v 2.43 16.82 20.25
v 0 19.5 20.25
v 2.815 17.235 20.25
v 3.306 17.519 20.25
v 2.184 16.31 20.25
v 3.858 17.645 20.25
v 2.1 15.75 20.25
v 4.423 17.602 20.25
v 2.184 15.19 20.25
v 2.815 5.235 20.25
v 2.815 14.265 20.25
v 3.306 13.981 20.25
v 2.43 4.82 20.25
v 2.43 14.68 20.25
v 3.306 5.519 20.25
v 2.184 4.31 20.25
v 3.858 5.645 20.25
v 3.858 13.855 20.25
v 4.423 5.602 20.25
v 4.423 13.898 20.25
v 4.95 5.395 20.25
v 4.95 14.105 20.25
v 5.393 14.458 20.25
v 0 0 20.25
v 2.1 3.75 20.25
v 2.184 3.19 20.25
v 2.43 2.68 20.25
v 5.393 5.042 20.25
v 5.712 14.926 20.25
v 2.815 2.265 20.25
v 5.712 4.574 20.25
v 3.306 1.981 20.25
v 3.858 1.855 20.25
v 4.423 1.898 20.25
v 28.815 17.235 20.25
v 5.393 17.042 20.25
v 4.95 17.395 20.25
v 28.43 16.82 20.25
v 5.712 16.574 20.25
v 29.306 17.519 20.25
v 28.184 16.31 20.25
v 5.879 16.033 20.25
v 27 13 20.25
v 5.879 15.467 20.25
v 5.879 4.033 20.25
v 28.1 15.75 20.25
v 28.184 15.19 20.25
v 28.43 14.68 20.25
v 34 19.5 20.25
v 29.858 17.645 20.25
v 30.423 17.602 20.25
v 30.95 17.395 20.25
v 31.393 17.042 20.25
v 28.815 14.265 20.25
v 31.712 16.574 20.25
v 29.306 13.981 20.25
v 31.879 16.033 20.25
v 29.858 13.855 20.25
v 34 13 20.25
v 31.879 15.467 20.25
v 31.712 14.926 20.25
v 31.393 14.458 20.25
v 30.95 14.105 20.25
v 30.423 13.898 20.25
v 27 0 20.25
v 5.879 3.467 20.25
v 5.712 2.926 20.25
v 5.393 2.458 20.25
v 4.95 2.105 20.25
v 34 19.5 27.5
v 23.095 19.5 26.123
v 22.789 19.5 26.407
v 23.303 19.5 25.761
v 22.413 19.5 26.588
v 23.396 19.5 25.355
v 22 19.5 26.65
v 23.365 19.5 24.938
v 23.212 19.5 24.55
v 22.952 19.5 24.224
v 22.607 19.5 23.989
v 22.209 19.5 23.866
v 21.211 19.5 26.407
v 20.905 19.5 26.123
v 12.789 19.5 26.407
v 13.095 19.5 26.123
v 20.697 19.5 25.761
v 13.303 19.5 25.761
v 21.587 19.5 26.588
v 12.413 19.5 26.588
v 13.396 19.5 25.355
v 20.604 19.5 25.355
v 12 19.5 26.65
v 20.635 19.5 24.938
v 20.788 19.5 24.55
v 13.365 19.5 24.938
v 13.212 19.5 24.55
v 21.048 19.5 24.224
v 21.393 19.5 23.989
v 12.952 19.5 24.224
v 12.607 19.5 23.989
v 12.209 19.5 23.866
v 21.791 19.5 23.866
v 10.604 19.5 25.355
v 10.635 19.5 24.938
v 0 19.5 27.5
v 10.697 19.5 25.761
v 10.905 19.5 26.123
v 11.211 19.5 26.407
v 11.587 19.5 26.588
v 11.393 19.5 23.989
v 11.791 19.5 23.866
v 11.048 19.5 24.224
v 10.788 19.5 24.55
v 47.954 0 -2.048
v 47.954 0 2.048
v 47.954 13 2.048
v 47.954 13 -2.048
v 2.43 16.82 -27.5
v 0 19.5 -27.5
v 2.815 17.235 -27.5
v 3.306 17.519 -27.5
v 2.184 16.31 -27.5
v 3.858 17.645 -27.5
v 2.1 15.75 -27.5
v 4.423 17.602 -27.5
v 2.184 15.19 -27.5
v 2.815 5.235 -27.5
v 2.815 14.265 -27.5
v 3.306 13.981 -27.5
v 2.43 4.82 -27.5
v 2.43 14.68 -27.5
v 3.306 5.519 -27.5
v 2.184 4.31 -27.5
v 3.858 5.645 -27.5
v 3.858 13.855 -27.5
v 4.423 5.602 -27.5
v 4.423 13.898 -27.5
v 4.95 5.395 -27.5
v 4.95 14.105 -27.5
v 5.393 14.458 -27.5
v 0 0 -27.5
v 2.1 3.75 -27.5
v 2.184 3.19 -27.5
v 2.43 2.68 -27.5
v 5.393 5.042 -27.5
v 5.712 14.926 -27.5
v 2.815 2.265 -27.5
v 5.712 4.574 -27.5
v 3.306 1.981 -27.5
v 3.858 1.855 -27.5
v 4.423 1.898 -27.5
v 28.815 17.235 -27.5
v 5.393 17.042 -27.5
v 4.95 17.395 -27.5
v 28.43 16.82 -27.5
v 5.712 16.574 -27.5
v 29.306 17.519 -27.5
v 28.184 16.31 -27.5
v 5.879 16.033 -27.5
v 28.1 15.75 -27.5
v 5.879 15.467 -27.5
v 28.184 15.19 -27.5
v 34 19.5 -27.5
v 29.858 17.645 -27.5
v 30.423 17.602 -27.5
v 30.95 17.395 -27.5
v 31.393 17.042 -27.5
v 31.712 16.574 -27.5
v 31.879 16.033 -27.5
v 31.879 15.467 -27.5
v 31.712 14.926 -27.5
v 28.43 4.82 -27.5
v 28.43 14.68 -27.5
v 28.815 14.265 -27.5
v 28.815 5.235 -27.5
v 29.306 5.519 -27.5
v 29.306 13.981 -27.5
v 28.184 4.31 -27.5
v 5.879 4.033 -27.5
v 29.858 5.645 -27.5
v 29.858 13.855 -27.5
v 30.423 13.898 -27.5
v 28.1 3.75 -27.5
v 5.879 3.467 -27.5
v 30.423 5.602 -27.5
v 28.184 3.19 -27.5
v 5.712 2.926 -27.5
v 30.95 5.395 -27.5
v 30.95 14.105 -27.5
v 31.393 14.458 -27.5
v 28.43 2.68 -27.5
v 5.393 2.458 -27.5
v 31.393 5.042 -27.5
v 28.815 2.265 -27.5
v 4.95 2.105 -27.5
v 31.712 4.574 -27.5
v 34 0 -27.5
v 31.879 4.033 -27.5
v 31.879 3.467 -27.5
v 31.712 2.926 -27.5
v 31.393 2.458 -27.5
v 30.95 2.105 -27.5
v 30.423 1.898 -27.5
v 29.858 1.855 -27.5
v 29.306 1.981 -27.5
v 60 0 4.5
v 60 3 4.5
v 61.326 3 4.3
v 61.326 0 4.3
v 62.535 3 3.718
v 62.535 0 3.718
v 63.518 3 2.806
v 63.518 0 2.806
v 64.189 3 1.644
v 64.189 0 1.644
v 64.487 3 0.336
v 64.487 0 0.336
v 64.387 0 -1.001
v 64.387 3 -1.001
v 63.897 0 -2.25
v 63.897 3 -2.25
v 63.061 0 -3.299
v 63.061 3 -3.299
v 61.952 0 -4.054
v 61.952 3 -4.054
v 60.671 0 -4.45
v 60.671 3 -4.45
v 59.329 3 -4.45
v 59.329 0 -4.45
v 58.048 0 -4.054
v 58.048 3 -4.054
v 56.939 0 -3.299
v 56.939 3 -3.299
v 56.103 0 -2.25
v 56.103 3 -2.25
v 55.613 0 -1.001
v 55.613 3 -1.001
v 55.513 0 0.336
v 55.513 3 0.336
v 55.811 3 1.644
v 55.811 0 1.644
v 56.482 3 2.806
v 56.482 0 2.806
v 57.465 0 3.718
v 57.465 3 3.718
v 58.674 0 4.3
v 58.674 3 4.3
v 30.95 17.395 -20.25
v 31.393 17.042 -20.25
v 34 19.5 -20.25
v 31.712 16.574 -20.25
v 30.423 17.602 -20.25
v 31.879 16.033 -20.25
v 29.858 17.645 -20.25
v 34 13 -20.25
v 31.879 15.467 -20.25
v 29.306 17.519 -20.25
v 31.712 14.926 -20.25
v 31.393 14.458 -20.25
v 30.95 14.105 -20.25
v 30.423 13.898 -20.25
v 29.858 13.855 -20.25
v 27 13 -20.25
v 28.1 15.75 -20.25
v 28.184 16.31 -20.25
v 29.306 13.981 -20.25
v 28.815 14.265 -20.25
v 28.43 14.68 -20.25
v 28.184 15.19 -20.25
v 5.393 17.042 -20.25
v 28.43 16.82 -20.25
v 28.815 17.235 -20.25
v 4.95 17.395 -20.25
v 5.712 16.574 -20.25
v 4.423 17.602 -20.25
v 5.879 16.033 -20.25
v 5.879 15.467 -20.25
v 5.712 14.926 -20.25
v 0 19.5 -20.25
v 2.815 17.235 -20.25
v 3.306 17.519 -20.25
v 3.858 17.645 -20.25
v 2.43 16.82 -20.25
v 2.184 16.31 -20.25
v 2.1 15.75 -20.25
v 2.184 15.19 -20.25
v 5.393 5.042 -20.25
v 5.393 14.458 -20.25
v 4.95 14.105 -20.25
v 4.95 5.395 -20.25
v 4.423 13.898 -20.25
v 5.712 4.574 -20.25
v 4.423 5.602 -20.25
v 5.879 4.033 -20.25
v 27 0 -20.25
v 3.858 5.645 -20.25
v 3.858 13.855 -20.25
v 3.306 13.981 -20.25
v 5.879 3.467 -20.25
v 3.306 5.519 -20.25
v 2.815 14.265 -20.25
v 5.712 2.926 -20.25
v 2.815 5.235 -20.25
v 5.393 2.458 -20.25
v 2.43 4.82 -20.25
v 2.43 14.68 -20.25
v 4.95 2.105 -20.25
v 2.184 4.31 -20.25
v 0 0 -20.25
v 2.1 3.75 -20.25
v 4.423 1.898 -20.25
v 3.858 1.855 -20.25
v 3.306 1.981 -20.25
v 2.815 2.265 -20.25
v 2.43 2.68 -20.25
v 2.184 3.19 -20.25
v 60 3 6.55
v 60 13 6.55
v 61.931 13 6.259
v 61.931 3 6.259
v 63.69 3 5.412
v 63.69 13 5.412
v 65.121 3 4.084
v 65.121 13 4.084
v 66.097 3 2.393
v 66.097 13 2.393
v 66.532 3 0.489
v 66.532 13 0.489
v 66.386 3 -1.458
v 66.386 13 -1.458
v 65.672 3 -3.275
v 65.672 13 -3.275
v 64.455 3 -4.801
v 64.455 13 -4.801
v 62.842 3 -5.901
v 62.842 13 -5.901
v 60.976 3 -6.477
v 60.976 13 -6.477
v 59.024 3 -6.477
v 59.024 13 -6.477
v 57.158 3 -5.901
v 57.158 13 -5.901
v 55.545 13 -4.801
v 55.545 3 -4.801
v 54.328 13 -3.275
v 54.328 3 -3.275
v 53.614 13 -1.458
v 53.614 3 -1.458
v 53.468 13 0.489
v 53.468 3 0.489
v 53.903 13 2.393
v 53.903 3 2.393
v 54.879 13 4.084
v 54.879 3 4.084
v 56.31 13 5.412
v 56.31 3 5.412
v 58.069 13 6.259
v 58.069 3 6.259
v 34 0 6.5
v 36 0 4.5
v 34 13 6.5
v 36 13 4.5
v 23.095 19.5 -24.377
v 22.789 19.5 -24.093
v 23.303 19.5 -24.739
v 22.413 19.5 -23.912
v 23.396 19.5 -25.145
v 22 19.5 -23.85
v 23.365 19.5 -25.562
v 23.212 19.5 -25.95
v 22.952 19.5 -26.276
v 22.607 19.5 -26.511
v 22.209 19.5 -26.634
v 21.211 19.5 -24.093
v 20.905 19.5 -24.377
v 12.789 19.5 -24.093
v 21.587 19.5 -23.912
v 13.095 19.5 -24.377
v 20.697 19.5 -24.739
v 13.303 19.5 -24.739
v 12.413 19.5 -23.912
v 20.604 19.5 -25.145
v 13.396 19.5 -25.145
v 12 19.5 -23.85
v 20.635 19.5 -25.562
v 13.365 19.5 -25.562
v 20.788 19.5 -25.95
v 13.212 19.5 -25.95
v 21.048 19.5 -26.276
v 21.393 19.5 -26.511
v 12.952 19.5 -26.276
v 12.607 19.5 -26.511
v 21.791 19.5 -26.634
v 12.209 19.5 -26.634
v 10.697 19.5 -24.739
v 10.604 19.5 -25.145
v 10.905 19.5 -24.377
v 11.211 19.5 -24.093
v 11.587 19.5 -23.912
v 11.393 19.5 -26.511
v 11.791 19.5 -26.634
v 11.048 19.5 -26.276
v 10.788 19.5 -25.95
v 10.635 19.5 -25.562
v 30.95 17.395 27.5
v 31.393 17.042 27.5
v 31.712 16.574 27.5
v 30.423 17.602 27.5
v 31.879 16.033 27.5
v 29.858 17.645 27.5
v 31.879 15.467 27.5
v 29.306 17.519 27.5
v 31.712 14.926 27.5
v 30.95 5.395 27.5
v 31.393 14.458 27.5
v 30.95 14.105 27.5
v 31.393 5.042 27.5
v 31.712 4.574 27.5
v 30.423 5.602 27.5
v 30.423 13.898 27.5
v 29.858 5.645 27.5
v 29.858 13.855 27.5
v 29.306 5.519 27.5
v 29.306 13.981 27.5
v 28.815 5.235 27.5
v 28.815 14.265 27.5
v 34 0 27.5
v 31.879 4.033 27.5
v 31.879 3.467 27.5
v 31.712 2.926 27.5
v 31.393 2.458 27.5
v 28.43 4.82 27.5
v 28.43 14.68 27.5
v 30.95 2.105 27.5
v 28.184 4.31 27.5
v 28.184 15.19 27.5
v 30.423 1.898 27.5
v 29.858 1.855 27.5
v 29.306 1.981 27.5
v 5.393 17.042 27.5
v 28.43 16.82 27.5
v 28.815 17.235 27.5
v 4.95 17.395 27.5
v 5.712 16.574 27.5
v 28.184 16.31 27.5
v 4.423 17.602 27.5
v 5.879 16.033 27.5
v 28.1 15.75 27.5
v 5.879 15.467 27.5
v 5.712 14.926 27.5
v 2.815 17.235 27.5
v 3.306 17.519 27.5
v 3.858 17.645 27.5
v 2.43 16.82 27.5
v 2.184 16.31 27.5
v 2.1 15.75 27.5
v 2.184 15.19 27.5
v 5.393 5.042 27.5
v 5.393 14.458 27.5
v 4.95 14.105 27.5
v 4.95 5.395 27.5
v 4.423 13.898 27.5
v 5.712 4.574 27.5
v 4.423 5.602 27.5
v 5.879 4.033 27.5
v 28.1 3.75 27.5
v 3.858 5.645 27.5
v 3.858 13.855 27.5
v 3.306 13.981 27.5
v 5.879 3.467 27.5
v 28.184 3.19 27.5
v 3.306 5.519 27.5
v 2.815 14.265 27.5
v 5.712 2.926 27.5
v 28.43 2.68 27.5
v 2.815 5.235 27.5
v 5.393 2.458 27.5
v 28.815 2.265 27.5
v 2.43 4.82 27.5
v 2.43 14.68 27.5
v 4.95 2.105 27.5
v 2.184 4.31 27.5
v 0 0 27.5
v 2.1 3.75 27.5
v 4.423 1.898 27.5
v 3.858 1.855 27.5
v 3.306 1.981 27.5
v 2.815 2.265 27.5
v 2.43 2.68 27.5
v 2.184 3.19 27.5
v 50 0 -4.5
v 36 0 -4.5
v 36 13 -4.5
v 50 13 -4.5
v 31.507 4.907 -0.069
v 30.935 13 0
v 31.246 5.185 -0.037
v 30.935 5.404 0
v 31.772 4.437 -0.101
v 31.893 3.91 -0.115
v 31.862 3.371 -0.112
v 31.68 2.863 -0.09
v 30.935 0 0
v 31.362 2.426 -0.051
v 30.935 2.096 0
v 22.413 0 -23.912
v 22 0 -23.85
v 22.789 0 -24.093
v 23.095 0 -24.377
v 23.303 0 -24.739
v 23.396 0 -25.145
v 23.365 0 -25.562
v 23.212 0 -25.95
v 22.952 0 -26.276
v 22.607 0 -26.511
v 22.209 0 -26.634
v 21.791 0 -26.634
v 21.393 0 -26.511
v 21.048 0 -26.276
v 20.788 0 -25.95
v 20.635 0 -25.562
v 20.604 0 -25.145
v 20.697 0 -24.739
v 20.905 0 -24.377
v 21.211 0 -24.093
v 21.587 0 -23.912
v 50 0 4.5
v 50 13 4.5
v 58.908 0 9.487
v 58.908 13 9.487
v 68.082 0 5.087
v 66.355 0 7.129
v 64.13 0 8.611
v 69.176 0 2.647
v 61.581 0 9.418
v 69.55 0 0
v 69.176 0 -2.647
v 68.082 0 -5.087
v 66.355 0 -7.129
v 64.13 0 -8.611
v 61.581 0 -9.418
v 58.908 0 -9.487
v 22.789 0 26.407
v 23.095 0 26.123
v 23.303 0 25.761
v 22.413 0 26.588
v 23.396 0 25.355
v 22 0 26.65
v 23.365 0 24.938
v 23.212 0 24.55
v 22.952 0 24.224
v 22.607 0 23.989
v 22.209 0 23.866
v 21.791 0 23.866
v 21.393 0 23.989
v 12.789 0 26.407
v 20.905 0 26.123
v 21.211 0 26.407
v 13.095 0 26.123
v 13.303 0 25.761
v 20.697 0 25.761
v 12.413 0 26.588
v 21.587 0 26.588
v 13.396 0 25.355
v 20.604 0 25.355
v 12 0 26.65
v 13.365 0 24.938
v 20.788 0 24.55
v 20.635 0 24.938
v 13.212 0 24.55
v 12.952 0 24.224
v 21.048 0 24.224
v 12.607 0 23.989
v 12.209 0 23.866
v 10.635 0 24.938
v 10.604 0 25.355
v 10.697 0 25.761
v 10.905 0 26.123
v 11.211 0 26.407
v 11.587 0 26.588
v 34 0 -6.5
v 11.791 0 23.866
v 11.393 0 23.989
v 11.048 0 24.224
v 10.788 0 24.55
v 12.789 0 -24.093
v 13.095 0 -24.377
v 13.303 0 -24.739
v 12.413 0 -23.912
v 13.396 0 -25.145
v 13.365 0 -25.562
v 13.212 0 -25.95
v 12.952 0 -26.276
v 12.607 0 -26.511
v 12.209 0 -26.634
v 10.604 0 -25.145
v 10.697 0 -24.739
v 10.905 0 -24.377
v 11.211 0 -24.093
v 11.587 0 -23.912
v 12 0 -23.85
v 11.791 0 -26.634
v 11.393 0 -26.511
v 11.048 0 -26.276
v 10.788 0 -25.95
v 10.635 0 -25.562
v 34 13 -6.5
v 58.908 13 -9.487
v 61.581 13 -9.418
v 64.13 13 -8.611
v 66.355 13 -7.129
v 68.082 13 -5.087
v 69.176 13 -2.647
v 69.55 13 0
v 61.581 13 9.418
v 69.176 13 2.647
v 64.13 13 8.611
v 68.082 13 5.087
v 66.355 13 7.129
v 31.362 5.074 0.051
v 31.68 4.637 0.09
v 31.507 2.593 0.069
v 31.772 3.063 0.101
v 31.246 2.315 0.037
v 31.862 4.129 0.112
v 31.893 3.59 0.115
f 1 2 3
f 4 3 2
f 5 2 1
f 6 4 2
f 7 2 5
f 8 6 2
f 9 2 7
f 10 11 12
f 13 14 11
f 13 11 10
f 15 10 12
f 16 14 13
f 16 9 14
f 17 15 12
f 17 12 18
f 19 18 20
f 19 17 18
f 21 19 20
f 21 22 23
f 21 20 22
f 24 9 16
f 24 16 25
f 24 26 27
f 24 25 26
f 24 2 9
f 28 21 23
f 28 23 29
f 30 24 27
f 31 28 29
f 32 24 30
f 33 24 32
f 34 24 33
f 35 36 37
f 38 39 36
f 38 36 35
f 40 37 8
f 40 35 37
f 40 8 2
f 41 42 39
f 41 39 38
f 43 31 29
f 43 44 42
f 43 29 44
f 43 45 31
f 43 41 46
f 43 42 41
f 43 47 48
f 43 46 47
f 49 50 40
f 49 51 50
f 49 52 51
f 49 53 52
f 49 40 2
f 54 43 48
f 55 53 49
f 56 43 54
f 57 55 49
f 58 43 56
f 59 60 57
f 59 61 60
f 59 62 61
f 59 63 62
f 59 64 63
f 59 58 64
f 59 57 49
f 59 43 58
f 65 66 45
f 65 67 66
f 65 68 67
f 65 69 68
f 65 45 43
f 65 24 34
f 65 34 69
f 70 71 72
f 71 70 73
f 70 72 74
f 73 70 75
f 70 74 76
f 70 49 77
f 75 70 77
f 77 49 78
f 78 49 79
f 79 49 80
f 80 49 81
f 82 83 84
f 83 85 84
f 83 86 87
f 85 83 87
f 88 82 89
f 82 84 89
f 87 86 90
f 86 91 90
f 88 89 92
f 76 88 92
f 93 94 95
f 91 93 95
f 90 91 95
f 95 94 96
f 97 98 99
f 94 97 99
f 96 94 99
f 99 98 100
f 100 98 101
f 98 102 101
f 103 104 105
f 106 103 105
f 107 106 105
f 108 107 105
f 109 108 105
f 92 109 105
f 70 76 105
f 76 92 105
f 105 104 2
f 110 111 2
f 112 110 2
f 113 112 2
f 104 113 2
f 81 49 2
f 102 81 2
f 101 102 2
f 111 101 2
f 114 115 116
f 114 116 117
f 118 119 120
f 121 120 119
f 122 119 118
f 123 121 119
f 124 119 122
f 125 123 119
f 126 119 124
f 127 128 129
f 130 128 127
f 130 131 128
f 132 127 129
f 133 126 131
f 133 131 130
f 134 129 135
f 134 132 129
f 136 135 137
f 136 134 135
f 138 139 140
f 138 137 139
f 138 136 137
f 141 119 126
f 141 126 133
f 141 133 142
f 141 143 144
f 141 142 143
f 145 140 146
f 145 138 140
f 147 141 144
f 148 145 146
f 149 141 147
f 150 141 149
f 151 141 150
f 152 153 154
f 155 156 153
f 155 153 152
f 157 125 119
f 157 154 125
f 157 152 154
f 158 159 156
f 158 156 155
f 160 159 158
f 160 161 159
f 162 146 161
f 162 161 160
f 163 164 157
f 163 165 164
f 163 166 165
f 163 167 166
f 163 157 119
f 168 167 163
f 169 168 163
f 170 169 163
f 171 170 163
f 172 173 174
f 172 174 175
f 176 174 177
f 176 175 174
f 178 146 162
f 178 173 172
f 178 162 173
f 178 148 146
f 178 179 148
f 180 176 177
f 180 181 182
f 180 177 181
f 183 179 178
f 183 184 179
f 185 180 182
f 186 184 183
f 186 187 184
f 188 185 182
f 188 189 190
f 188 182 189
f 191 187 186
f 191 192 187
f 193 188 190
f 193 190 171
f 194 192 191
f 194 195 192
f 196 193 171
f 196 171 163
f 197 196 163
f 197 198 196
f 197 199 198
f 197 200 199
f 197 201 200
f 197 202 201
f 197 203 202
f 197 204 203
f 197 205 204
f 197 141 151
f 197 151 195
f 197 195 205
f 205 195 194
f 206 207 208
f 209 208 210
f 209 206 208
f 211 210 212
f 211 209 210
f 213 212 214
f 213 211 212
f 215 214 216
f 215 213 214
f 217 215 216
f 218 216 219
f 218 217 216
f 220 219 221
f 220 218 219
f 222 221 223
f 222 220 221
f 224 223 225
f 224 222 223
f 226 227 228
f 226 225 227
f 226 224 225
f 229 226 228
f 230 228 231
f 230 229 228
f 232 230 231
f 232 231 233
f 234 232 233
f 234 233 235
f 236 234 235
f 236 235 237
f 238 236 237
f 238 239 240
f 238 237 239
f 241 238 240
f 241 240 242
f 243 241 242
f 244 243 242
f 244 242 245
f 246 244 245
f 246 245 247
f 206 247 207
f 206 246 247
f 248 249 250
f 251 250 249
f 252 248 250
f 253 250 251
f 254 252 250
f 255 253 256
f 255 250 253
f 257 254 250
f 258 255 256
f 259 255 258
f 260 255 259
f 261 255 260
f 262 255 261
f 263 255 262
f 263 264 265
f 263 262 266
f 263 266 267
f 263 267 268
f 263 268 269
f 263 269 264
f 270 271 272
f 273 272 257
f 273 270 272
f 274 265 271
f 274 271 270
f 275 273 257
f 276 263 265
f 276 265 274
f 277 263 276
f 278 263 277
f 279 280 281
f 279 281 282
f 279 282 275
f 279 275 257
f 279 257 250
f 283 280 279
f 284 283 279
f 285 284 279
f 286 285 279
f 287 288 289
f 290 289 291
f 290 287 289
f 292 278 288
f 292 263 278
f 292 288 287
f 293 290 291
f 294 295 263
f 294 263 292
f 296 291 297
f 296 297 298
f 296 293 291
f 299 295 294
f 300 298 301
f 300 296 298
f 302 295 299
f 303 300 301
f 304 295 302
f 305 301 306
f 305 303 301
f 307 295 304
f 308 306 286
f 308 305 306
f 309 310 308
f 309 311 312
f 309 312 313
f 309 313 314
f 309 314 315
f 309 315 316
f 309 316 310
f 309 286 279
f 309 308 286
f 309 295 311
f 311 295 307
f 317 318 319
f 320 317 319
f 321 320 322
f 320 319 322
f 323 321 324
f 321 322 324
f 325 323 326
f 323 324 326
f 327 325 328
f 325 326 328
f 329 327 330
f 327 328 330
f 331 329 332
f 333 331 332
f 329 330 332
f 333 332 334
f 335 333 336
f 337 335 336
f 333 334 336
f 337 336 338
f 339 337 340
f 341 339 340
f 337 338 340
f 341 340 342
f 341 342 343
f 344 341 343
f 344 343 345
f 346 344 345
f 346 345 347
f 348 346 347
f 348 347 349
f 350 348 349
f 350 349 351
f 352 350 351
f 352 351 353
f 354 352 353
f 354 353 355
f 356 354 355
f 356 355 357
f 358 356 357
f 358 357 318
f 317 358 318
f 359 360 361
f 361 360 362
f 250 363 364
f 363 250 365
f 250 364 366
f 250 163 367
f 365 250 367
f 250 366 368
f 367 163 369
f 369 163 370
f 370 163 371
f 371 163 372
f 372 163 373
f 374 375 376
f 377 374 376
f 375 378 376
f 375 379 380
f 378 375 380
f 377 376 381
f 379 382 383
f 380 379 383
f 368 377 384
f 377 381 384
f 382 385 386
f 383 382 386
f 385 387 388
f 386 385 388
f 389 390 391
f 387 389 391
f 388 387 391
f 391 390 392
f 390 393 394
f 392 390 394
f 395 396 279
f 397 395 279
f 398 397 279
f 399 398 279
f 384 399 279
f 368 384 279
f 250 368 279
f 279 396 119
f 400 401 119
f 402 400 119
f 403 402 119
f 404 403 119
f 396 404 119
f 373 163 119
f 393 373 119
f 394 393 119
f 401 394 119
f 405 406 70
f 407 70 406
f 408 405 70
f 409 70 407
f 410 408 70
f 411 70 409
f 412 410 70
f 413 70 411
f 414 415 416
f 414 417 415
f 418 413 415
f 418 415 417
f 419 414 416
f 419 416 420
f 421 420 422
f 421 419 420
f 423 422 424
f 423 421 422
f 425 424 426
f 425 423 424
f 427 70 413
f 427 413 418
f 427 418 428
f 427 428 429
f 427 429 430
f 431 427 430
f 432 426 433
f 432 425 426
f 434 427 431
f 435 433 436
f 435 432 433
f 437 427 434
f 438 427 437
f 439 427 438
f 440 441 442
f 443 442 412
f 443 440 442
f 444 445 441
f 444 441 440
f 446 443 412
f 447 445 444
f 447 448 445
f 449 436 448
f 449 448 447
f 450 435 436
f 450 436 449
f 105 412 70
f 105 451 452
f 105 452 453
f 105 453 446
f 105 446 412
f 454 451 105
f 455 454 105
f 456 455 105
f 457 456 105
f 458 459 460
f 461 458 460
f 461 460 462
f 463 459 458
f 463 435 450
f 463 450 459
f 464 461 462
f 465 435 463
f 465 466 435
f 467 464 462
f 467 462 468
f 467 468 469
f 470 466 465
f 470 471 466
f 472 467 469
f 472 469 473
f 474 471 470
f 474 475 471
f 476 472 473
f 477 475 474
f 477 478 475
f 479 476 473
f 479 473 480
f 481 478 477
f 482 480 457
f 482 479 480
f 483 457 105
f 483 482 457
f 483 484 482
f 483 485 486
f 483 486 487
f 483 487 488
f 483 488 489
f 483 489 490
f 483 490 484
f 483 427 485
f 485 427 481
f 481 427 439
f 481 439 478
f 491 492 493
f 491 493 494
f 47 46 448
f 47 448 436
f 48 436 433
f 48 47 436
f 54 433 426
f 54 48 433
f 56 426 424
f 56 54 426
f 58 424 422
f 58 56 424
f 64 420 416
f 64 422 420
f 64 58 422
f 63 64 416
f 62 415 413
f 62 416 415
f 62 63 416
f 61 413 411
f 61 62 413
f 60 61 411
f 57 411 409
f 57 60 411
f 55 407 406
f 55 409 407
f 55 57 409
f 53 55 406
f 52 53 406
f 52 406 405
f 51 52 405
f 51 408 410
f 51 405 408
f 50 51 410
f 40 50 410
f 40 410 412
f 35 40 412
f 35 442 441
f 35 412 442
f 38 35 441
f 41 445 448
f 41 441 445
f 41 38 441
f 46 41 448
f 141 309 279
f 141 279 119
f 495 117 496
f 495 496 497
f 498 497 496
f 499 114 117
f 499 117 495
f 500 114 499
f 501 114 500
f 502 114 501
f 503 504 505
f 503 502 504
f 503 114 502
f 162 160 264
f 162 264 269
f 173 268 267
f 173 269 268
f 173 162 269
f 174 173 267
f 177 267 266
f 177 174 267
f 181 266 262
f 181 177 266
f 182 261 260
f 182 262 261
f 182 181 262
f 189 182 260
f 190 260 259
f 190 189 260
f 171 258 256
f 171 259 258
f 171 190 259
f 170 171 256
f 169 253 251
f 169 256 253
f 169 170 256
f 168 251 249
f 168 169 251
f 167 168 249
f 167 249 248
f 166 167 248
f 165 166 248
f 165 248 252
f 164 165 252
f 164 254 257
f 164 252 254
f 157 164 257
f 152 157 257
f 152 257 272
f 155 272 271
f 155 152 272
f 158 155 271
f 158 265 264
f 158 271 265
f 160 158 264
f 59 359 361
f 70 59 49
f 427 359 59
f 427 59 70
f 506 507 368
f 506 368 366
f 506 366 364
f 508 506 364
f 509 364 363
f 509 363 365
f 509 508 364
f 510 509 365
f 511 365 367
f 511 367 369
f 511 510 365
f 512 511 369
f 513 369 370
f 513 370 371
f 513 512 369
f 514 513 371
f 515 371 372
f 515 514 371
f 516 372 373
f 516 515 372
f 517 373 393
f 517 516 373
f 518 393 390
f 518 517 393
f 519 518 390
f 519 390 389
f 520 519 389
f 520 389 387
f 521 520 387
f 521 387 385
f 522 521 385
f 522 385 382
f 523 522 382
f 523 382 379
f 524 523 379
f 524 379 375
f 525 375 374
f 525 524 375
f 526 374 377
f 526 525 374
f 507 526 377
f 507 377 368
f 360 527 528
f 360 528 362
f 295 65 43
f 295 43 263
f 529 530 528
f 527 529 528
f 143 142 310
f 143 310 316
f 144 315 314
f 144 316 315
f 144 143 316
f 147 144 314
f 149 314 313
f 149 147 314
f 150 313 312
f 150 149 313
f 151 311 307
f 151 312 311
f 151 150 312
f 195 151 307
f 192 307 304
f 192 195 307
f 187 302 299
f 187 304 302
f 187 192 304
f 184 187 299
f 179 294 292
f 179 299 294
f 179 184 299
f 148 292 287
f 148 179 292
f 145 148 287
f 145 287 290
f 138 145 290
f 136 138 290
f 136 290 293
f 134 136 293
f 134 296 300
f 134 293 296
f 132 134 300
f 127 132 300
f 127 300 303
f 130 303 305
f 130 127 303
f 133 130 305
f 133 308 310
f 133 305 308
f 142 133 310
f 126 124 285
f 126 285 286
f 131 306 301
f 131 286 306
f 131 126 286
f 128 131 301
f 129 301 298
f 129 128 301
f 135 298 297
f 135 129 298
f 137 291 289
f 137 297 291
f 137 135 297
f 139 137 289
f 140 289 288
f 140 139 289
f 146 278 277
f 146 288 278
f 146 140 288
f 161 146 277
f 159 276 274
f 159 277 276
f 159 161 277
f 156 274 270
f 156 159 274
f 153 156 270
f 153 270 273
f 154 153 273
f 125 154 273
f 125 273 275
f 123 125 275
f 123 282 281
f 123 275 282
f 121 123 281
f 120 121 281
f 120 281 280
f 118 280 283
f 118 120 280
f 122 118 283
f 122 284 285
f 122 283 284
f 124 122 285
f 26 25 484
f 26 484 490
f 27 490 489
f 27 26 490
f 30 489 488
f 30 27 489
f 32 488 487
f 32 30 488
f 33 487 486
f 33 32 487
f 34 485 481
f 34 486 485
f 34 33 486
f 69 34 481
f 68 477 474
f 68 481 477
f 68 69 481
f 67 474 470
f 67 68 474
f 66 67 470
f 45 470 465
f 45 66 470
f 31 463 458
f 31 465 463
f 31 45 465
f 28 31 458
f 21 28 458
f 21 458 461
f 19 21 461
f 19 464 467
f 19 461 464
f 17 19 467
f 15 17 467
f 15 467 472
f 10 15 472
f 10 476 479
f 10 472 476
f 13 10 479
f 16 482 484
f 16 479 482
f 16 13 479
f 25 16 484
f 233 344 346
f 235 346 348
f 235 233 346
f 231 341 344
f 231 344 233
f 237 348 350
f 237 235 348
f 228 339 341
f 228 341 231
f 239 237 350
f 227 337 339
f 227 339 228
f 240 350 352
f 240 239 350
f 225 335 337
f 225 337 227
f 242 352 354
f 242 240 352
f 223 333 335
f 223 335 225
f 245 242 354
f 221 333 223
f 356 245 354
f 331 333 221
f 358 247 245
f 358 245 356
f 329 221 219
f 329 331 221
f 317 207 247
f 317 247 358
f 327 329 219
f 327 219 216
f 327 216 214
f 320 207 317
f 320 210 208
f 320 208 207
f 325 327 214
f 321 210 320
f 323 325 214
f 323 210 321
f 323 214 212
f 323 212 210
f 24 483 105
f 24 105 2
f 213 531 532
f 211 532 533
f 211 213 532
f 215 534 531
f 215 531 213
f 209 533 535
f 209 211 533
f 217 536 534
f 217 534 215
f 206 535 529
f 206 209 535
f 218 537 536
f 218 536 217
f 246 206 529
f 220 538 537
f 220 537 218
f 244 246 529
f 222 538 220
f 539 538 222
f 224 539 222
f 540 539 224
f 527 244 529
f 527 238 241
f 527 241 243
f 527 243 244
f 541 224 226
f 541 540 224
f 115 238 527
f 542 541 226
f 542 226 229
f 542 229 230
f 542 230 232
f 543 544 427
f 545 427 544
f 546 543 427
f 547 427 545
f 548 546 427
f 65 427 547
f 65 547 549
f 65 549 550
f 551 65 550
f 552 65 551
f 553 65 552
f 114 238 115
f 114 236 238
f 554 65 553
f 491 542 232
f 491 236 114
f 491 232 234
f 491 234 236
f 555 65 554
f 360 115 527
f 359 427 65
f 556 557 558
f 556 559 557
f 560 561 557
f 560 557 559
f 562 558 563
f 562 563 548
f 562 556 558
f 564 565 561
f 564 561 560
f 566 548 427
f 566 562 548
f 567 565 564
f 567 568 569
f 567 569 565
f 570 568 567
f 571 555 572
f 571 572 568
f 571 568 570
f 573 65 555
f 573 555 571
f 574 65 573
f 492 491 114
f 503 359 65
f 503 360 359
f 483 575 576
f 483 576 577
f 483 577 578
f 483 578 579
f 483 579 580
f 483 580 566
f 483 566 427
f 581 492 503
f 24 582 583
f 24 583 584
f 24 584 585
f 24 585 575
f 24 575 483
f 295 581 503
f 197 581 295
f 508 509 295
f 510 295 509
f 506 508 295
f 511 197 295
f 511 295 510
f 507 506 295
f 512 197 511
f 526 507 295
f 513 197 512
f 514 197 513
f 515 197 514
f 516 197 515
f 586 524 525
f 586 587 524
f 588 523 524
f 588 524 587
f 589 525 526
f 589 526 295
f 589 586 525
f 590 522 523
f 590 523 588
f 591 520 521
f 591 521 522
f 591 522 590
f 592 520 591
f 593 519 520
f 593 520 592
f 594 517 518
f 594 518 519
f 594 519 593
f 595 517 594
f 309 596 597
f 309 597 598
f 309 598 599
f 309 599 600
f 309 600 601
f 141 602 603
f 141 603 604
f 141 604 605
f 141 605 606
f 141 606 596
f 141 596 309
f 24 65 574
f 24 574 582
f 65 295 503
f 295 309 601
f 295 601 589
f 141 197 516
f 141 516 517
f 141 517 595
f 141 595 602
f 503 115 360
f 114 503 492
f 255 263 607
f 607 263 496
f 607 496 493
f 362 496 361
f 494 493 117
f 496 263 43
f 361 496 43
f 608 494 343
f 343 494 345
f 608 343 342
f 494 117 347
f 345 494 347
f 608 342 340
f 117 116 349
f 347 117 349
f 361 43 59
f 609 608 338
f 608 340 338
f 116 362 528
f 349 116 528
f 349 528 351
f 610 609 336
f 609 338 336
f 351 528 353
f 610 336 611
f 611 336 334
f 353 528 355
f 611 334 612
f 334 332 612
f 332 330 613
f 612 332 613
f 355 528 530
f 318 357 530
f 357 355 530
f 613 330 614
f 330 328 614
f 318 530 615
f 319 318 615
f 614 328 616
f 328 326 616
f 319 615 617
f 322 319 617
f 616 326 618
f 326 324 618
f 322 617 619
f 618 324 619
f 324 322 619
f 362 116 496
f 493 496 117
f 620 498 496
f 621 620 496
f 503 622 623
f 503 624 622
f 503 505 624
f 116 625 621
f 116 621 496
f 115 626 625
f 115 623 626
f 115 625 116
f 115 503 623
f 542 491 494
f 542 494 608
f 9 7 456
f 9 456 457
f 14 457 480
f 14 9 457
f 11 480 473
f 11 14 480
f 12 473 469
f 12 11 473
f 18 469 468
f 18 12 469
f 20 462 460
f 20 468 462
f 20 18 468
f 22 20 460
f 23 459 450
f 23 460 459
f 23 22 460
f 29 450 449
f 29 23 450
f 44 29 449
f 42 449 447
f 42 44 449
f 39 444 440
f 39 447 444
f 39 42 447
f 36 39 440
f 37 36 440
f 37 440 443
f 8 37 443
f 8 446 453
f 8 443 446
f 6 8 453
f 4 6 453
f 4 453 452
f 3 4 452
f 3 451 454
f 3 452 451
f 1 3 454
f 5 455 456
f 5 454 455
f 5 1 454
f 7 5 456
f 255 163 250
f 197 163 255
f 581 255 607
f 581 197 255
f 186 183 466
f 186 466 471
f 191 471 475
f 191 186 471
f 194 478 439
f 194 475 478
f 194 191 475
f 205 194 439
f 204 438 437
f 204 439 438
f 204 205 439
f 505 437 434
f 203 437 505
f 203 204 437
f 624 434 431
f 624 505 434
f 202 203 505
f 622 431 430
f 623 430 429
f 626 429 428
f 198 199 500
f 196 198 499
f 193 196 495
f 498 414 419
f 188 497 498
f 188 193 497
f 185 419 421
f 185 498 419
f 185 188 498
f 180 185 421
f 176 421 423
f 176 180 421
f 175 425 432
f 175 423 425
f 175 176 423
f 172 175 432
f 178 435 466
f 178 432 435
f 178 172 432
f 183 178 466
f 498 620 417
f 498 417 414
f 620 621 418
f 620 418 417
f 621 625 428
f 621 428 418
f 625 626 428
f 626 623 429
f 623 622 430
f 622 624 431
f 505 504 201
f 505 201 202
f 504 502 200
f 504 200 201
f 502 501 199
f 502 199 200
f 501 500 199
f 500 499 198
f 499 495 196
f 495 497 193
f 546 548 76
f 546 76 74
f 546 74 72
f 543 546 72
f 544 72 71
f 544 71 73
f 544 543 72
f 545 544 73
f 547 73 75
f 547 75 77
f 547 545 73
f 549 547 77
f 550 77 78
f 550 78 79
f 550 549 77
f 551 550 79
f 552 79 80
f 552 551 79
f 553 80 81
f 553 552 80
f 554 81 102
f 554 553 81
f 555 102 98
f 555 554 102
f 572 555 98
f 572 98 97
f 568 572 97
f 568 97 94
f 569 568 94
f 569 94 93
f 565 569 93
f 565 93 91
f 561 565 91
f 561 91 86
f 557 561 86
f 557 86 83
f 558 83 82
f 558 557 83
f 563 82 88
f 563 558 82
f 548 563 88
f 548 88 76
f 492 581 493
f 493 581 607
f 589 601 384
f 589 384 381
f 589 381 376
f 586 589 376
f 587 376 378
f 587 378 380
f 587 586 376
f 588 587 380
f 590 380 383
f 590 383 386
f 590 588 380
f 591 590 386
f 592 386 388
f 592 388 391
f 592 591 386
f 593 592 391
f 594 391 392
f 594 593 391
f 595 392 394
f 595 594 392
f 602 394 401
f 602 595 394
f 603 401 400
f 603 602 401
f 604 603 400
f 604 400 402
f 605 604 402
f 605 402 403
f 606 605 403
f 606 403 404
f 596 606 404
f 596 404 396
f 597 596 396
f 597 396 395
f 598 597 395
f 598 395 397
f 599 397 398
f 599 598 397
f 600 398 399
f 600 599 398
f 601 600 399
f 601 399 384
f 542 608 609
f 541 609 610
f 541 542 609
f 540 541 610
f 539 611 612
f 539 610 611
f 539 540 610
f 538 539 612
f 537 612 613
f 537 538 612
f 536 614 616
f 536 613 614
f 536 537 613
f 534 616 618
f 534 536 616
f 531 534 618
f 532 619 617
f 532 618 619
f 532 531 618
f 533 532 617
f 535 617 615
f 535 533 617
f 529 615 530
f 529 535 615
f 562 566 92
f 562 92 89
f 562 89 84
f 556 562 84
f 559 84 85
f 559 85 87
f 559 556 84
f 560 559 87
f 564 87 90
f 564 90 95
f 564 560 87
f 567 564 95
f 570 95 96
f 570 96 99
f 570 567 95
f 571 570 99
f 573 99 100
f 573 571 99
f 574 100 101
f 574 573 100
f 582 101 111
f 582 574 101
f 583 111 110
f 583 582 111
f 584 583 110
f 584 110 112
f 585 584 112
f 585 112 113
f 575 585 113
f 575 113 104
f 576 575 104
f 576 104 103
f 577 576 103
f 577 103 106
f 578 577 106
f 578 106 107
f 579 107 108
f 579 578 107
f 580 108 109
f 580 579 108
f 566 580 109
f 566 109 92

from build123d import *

# Parameters (mm, degrees)
SKETCH8_R                      = 4.5
SKETCH8_R_2                    = 1.4
BOSS_EXTRUDE2_DEPTH            = 19.5
SKETCH10_R                     = 6.55
CUT_EXTRUDE6_DEPTH             = 16.5
CUT_EXTRUDE7_DEPTH             = 43
CUT_EXTRUDE7_DEPTH_BACK        = 47
SKETCH12_R                     = 1.9
CUT_EXTRUDE8_REACH             = 79.29
SKETCH13_W                     = 46.335828735
SKETCH13_H                     = 6.5
CUT_EXTRUDE8_DIRECTION_2_REACH = 79.29
CHAMFER2_SIZE                  = 2
CUT_EXTRUDE9_DEPTH             = 13


with BuildPart() as part:
    # Sketch8 → Boss-Extrude2 (new body)
    with BuildSketch(Plane(origin=(0, 0, 0), x_dir=(1, 0, 0), z_dir=(0, 1, 0))):
        with BuildLine():
            Line((34, 4.5), (50, 4.5))
            Line((50, 4.5), (58.907986832, 9.487360394))
            ThreePointArc((58.907986832, 9.487360394), (69.55, 0), (58.907986832, -9.487360394))
            Line((58.907986832, -9.487360394), (50, -4.5))
            Line((50, -4.5), (34, -4.5))
            Line((34, -4.5), (34, -27.5))
            Line((34, -27.5), (0, -27.5))
            Line((0, -27.5), (0, -20.25))
            Line((0, -20.25), (27, -20.25))
            Line((27, -20.25), (27, 20.25))
            Line((27, 20.25), (0, 20.25))
            Line((0, 20.25), (0, 27.5))
            Line((0, 27.5), (34, 27.5))
            Line((34, 27.5), (34, 4.5))
        make_face()
        with Locations(Location((60, 0, 0), (0, 0, 270))):
            Circle(SKETCH8_R, mode=Mode.SUBTRACT)
        with Locations(Location((22, 25.25, 0), (0, 0, 270))):
            Circle(SKETCH8_R_2, mode=Mode.SUBTRACT)
        with Locations(Location((12, 25.25, 0), (0, 0, 270))):
            Circle(SKETCH8_R_2, mode=Mode.SUBTRACT)
        with Locations(Location((22, -25.25, 0), (0, 0, 270))):
            Circle(SKETCH8_R_2, mode=Mode.SUBTRACT)
        with Locations(Location((12, -25.25, 0), (0, 0, 270))):
            Circle(SKETCH8_R_2, mode=Mode.SUBTRACT)
    extrude(amount=BOSS_EXTRUDE2_DEPTH)

    # Sketch10 → Cut-Extrude6 (cut)
    with BuildSketch(Plane(origin=(0, 19.5, 0), x_dir=(1, 0, 0), z_dir=(0, 1, 0))):
        with Locations(Location((60, 0, 0), (0, 0, 270))):
            Circle(SKETCH10_R)
    extrude(amount=-CUT_EXTRUDE6_DEPTH, mode=Mode.SUBTRACT)

    # Sketch12 → Cut-Extrude7 (cut, two sides: drawn at the far end of the back side and taken through both)
    with BuildSketch(Plane.XY.offset(-CUT_EXTRUDE7_DEPTH_BACK)):
        with Locations(Location((4, 15.75, 0), (0, 0, 180))):
            Circle(SKETCH12_R)
        with Locations(Location((4, 3.75, 0), (0, 0, 180))):
            Circle(SKETCH12_R)
        with Locations(Location((30, 15.75, 0), (0, 0, 180))):
            Circle(SKETCH12_R)
        with Locations(Location((30, 3.75, 0), (0, 0, 180))):
            Circle(SKETCH12_R)
    extrude(amount=CUT_EXTRUDE7_DEPTH + CUT_EXTRUDE7_DEPTH_BACK, mode=Mode.SUBTRACT)

    # Cut-Extrude8: up to this face of the body (flat: up to its plane)
    cut_extrude8_end = Plane(part.part.faces().sort_by_distance((13.927698034, 9.75, -20.25))[0])
    # Sketch13 → Cut-Extrude8 (cut, up to the picked face)
    with BuildSketch(Plane.XY, mode=Mode.PRIVATE) as cut_extrude8_sk1:
        with Locations((46.382085633, 16.25)):
            Rectangle(SKETCH13_W, SKETCH13_H)
    cut_extrude8_tool1 = split(extrude(cut_extrude8_sk1.sketch, amount=-CUT_EXTRUDE8_REACH, mode=Mode.PRIVATE), bisect_by=cut_extrude8_end, keep=Keep.BOTH, mode=Mode.PRIVATE)
    add(cut_extrude8_tool1.solids().sort_by(Axis((46.382086, 16.25, 0), (0, 0, -1)))[0], mode=Mode.SUBTRACT)

    # Cut-Extrude8 direction 2: up to this face of the body (flat: up to its plane)
    cut_extrude8_direction_2_end = Plane(part.part.faces().sort_by_distance((13.927698034, 9.75, 20.25))[0])
    # Sketch13 → Cut-Extrude8 direction 2 (cut, up to the picked face)
    with BuildSketch(Plane.XY, mode=Mode.PRIVATE) as cut_extrude8_direction_2_sk1:
        with Locations((46.382085633, 16.25)):
            Rectangle(SKETCH13_W, SKETCH13_H)
    cut_extrude8_direction_2_tool1 = split(extrude(cut_extrude8_direction_2_sk1.sketch, amount=CUT_EXTRUDE8_DIRECTION_2_REACH, mode=Mode.PRIVATE), bisect_by=cut_extrude8_direction_2_end, keep=Keep.BOTH, mode=Mode.PRIVATE)
    add(cut_extrude8_direction_2_tool1.solids().sort_by(Axis((46.382086, 16.25, 0), (0, 0, 1)))[0], mode=Mode.SUBTRACT)

    # Chamfer2
    chamfer2_edges = [part.edges().sort_by_distance(p)[0] for p in [
        (34, 6.5, 4.5),
        (34, 6.5, -4.5),
    ]]
    chamfer(chamfer2_edges, length=CHAMFER2_SIZE)

    # Sketch16 → Cut-Extrude9 (cut)
    with BuildSketch(Plane(origin=(0, 0, 0), x_dir=(1, 0, 0), z_dir=(0, 1, 0))):
        Polygon((47.953686356, -2.047894041), (47.953686356, 2.047894041), (30.934643554, 0), align=None)
    extrude(amount=CUT_EXTRUDE9_DEPTH, mode=Mode.SUBTRACT)


solid = part.part
